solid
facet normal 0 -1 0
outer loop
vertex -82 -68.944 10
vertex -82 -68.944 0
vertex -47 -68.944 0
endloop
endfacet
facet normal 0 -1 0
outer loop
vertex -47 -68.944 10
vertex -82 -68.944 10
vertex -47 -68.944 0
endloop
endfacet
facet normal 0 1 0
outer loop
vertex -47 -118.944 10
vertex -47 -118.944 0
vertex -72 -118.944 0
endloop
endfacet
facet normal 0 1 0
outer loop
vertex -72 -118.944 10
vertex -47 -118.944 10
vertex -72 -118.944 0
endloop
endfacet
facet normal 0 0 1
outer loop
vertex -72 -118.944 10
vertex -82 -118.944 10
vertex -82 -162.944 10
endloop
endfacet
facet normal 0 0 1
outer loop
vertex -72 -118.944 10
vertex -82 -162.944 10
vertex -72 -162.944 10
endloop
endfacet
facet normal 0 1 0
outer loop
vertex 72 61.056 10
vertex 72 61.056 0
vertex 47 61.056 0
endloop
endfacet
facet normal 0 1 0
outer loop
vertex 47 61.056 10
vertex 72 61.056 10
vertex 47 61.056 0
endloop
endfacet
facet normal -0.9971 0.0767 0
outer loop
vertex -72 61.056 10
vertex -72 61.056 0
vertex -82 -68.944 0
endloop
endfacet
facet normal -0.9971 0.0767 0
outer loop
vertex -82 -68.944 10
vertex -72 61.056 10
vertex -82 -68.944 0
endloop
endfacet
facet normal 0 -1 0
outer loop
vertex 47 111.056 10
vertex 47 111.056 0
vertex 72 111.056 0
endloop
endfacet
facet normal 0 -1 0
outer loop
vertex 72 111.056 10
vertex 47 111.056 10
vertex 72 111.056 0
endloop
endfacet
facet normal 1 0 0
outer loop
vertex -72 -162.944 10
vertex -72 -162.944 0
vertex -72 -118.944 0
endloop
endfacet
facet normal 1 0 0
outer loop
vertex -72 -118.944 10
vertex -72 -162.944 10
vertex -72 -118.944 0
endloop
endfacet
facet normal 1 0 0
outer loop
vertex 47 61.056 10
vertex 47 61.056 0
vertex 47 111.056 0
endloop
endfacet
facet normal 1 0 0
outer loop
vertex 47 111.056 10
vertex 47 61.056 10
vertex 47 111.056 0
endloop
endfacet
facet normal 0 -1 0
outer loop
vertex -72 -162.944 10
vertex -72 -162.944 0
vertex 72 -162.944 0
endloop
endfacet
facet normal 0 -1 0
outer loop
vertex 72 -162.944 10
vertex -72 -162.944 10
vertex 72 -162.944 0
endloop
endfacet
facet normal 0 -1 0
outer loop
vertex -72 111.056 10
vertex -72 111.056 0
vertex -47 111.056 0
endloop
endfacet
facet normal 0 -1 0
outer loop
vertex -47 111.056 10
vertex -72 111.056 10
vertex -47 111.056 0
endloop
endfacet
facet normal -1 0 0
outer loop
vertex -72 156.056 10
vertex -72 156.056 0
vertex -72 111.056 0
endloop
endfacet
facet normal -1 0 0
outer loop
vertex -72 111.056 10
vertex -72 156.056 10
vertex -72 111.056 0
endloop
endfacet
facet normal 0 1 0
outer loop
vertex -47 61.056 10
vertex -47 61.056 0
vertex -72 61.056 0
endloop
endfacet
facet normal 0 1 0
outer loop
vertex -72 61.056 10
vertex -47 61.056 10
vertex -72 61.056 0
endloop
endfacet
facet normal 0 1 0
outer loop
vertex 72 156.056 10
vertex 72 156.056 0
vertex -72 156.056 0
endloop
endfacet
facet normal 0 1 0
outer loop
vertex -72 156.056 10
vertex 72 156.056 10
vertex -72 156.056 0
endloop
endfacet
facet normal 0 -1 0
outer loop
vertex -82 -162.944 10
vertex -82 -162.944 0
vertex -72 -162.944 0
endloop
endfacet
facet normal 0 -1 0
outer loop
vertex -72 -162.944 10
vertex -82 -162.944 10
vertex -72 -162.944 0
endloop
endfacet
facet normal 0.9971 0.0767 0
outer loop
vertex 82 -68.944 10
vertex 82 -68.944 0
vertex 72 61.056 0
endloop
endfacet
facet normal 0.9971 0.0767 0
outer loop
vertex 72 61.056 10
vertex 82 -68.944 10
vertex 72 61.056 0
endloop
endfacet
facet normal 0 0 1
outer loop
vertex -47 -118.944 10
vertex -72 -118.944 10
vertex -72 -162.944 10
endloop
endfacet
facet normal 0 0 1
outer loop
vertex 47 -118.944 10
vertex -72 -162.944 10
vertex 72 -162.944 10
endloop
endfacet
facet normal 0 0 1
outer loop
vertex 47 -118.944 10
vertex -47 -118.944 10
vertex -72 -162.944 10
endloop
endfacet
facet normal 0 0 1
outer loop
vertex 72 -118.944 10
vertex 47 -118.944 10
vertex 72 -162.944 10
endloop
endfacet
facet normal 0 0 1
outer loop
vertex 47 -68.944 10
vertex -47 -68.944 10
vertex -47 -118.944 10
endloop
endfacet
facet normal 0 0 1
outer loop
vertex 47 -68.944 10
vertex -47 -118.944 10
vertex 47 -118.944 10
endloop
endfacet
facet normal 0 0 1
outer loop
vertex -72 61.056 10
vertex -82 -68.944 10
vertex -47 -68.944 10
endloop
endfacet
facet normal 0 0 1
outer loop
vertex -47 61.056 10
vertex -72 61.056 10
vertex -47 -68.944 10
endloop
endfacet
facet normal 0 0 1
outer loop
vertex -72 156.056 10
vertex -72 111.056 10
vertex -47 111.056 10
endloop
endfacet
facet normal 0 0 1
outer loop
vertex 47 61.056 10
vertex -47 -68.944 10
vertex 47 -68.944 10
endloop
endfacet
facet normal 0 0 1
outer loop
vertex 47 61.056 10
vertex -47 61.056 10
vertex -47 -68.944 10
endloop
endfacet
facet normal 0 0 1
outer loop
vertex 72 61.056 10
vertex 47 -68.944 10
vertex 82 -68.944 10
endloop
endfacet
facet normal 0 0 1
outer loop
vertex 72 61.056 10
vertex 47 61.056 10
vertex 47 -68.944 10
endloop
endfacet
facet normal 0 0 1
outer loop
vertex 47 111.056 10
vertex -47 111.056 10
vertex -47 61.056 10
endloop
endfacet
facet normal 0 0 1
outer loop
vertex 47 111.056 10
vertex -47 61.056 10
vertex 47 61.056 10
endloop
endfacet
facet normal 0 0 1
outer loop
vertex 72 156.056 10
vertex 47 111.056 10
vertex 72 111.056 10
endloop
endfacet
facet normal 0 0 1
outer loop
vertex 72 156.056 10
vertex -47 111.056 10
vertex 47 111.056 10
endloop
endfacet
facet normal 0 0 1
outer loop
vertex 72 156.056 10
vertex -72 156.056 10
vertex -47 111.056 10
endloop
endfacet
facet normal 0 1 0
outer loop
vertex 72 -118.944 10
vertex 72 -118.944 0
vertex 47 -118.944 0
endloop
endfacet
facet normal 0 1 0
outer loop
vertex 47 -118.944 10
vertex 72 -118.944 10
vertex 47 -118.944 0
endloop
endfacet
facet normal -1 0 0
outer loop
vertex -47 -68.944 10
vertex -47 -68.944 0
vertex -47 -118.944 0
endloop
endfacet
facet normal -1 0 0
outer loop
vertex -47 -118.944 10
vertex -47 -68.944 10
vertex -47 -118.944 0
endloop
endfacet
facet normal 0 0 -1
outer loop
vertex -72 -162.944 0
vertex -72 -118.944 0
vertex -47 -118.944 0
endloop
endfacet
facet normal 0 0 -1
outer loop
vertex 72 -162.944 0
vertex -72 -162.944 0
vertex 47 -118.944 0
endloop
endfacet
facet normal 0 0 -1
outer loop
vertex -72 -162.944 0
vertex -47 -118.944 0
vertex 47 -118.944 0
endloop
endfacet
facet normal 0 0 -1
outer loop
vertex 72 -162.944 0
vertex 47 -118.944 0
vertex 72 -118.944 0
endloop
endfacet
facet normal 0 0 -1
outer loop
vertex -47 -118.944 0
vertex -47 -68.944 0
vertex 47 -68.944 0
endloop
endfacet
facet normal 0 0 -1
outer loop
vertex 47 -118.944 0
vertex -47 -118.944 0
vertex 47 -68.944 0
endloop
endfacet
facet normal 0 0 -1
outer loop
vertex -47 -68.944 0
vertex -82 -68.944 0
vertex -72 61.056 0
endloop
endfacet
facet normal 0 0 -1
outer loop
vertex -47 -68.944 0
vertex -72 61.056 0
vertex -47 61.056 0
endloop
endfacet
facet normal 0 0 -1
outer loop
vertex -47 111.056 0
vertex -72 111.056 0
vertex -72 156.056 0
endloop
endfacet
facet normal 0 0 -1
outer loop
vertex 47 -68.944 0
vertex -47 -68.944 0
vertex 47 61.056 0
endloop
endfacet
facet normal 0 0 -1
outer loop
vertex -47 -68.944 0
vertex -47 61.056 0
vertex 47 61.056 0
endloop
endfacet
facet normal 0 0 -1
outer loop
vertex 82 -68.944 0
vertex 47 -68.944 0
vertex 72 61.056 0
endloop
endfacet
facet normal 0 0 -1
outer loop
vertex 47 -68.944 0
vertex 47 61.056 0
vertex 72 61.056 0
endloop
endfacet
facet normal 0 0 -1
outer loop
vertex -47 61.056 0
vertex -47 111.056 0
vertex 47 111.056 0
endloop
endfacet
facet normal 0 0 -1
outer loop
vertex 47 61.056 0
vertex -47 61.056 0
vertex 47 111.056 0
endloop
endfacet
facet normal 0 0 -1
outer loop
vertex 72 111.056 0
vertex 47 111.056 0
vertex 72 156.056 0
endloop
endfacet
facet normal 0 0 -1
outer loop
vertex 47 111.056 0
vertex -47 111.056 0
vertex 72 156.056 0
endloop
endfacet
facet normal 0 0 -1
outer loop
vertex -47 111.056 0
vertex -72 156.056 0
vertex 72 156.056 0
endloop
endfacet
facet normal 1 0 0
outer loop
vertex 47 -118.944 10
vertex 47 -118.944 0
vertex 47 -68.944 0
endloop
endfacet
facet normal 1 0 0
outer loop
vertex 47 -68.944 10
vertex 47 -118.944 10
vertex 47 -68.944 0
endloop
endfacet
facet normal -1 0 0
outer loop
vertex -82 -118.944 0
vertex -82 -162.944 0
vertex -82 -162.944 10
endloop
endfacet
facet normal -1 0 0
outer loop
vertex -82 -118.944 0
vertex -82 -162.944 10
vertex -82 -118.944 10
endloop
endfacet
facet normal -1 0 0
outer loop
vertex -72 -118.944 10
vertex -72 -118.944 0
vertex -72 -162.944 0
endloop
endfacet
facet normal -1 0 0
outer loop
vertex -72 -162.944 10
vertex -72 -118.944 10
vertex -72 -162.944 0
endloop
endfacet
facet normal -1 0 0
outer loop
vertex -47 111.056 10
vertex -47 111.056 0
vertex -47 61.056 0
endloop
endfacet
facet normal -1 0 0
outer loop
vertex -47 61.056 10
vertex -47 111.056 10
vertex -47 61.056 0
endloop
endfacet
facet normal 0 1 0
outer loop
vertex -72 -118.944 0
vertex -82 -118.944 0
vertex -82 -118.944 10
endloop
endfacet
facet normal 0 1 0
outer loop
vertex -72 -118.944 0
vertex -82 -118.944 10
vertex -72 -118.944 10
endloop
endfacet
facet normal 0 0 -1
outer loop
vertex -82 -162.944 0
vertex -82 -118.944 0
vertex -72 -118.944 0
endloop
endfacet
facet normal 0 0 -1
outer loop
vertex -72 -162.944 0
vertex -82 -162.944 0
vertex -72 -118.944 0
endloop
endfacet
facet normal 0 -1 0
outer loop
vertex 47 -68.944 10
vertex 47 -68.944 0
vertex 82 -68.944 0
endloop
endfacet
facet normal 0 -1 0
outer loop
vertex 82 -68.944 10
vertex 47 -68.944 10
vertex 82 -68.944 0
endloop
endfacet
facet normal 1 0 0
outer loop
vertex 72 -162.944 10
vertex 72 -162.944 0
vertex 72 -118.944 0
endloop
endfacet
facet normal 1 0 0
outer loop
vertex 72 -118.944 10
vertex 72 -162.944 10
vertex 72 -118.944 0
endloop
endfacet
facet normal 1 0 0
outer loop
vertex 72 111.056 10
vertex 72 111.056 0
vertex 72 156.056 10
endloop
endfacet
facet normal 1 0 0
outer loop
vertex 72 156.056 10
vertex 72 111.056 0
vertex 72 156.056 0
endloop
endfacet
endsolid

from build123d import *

# Parameters (mm, degrees)
F2_DEPTH = 10
F1_W     = 10
F1_H     = 44


with BuildPart() as f2:
    # F0 (on Top) → F2 (new body)
    with BuildSketch(Plane.XY):
        Polygon((0, 156.0560178757), (-72, 156.0560178757), (-72, 111.0560178757), (-47, 111.0560178757), (-47, 61.0560178757), (-72, 61.0560178757), (-82, -68.9439821243), (-72, -68.9439821243), (-47, -68.9439821243), (-47, -118.9439821243), (-72, -118.9439821243), (-72, -162.9439821243), (0, -162.9439821243), align=None)
        Polygon((72, 156.0560178757), (0, 156.0560178757), (0, -162.9439821243), (72, -162.9439821243), (72, -118.9439821243), (47, -118.9439821243), (47, -68.9439821243), (72, -68.9439821243), (82, -68.9439821243), (72, 61.0560178757), (47, 61.0560178757), (47, 111.0560178757), (72, 111.0560178757), align=None)
    extrude(amount=F2_DEPTH)


with BuildPart() as f2b:
    # F1 (on face) → F2, piece 2 (new body)
    with BuildSketch(Plane.XY):
        with Locations((-77, -140.9439821243)):
            Rectangle(F1_W, F1_H)
    extrude(amount=F2_DEPTH)


solid = Compound([f2.part, f2b.part])
